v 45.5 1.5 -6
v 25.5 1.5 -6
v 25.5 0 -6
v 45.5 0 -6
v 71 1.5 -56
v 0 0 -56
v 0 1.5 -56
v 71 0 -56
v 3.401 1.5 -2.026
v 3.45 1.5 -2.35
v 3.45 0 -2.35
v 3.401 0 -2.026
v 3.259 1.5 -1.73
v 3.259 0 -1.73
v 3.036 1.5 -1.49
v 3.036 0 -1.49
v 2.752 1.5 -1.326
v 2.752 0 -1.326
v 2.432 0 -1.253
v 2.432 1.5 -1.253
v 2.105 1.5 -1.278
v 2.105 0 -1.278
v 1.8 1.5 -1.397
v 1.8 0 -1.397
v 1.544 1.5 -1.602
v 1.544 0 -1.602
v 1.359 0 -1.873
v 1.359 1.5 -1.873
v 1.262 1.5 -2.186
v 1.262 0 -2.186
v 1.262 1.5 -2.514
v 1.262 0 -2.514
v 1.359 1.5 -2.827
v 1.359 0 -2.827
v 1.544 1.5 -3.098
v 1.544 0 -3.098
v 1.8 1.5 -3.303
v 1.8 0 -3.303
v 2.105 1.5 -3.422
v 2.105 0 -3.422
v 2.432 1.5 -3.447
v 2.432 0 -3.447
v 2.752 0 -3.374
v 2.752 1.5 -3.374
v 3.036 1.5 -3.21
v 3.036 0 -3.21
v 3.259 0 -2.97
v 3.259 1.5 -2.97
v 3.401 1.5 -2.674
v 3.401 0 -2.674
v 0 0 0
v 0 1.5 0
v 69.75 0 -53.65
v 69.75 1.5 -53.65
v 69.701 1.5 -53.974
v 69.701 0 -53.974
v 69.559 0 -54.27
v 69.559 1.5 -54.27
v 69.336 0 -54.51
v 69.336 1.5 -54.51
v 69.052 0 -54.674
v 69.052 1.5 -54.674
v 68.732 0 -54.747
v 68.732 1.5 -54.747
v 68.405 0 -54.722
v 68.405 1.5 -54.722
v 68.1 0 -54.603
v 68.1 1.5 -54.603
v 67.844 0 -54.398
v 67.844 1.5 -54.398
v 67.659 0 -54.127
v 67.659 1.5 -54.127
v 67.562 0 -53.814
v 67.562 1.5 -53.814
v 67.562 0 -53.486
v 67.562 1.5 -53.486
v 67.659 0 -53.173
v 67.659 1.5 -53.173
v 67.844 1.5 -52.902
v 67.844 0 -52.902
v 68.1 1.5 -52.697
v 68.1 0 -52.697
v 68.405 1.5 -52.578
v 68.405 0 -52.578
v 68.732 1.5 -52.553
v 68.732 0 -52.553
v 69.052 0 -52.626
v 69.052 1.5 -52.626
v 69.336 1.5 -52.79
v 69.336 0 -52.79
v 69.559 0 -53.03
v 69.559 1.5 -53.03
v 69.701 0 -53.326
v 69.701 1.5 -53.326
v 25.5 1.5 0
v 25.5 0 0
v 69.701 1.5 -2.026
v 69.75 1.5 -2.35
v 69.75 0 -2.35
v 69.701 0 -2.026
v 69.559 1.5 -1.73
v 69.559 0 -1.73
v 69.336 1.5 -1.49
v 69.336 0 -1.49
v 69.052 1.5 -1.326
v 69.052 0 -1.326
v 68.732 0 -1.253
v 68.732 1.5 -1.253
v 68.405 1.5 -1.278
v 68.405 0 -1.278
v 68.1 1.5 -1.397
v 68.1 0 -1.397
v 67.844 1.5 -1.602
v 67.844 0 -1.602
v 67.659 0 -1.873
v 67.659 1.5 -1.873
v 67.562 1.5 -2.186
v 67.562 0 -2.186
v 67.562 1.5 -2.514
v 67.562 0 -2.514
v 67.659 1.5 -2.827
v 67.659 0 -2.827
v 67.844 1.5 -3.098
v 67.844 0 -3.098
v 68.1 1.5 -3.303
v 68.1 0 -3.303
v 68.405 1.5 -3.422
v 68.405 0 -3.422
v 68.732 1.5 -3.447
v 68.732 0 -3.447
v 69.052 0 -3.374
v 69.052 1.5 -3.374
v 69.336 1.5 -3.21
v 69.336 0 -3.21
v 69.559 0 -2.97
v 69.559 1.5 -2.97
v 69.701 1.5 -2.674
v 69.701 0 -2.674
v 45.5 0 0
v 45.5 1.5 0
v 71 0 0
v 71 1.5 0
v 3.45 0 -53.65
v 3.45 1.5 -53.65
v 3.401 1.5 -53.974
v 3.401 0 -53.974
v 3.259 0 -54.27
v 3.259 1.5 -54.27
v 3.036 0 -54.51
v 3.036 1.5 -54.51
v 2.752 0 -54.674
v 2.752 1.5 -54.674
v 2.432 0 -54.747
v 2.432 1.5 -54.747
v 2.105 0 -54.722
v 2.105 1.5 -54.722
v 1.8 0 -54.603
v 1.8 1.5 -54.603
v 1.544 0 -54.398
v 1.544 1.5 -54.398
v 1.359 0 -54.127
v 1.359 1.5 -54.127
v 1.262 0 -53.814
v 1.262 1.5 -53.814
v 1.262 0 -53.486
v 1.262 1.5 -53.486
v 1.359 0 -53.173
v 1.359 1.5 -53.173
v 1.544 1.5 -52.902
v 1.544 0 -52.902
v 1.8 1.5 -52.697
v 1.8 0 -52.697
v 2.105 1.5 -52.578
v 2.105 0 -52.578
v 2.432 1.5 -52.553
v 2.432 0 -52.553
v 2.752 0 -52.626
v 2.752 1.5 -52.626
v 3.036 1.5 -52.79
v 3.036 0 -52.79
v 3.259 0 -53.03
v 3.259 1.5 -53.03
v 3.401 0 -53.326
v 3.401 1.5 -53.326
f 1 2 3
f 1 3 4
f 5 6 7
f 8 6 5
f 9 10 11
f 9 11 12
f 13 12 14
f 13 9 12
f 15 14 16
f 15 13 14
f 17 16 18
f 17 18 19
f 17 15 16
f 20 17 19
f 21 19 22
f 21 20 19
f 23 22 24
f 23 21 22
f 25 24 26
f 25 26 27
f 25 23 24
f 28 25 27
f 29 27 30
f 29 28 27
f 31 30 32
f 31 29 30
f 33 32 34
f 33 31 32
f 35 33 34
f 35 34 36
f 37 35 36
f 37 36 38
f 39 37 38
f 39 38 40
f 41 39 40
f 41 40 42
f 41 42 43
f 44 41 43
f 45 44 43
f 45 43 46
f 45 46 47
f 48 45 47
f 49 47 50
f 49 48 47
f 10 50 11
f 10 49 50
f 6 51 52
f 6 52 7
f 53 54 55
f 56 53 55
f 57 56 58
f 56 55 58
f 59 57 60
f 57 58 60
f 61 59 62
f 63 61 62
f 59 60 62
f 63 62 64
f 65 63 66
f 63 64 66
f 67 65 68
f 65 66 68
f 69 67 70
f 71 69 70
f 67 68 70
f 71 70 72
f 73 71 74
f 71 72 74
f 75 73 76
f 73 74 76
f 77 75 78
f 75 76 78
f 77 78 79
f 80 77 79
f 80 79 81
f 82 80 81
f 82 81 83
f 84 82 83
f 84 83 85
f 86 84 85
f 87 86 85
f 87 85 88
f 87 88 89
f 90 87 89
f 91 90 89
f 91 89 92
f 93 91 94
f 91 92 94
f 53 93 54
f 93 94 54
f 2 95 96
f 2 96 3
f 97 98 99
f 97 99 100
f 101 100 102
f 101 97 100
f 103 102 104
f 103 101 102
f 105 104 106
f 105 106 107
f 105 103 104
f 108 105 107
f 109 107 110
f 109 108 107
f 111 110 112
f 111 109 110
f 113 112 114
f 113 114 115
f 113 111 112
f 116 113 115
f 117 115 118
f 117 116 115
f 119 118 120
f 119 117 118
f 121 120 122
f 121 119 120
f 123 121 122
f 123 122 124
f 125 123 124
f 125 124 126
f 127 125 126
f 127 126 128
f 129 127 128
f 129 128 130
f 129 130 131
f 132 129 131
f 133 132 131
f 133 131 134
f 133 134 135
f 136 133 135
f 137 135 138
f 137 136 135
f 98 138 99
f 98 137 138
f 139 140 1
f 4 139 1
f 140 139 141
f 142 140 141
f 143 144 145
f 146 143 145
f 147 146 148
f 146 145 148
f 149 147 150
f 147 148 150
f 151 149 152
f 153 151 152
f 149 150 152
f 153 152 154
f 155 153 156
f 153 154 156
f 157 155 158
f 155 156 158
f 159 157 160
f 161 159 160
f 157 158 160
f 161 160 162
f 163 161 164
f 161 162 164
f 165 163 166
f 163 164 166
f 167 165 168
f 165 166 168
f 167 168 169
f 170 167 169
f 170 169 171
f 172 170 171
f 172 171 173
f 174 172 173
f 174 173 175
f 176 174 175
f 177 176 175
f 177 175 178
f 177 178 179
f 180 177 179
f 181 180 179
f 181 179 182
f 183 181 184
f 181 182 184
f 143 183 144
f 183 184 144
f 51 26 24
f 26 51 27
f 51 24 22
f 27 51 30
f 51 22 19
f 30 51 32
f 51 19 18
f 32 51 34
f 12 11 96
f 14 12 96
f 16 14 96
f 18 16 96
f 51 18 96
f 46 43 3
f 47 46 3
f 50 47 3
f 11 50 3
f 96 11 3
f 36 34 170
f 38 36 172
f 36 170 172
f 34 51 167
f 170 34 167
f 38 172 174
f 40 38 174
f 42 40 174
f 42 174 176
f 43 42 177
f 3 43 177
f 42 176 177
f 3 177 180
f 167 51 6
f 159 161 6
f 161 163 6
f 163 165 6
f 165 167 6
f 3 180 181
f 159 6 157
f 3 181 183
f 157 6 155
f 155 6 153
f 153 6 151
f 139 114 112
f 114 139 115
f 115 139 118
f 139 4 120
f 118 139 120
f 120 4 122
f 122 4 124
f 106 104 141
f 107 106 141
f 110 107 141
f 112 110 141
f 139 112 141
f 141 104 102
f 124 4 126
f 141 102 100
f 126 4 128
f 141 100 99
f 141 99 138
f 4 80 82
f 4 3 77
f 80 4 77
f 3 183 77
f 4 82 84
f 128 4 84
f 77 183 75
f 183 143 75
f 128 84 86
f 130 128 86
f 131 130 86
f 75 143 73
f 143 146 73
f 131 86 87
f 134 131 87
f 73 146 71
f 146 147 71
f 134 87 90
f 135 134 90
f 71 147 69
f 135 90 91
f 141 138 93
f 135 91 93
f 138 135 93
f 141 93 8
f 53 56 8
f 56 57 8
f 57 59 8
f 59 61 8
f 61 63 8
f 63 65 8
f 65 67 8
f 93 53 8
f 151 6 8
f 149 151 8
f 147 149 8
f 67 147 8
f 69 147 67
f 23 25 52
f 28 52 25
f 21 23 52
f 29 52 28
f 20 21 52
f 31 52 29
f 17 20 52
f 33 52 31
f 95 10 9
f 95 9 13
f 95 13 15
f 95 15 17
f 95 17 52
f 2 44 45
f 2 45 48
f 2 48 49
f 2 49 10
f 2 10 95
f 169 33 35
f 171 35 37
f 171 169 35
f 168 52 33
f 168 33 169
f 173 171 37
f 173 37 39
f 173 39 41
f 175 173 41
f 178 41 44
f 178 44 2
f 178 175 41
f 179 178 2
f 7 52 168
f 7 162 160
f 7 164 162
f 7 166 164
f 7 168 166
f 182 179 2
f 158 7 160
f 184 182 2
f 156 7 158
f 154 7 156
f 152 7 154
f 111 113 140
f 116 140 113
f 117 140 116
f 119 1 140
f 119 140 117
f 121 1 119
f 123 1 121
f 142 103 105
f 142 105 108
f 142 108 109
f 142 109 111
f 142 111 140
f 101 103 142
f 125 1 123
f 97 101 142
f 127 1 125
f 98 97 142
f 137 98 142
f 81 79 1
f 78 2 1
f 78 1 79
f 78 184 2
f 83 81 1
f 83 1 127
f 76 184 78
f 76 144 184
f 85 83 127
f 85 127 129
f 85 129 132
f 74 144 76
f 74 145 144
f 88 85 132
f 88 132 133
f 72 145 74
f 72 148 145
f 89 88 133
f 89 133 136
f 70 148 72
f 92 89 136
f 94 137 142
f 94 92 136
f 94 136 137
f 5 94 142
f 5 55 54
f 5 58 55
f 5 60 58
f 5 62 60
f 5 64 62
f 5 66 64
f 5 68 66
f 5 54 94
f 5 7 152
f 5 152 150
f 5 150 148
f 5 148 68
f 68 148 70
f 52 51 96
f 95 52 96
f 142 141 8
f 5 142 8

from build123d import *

# Parameters (mm, degrees)
SKETCH1_W           = 71
SKETCH1_H           = 56
BOSS_EXTRUDE1_DEPTH = 1.5
SKETCH2_W           = 20
SKETCH2_H           = 6
CUT_EXTRUDE1_DEPTH  = 1.5
SKETCH5_R           = 1.1
CUT_EXTRUDE2_DEPTH  = 1.5


with BuildPart() as part:
    # Sketch1 → Boss-Extrude1 (new body)
    with BuildSketch(Plane(origin=(0, 0, 0), x_dir=(1, 0, 0), z_dir=(0, 1, 0))):
        with Locations((35.5, 28)):
            Rectangle(SKETCH1_W, SKETCH1_H)
    extrude(amount=BOSS_EXTRUDE1_DEPTH)

    # Sketch2 → Cut-Extrude1 (cut)
    with BuildSketch(Plane(origin=(0, 1.5, 0), x_dir=(1, 0, 0), z_dir=(0, 1, 0))):
        with Locations((35.5, 3)):
            Rectangle(SKETCH2_W, SKETCH2_H)
    extrude(amount=-CUT_EXTRUDE1_DEPTH, mode=Mode.SUBTRACT)

    # Sketch5 → Cut-Extrude2 (cut)
    with BuildSketch(Plane(origin=(0, 1.5, 0), x_dir=(1, 0, 0), z_dir=(0, 1, 0))):
        with Locations((2.35, 53.65)):
            Circle(SKETCH5_R)
        with Locations((68.65, 53.65)):
            Circle(SKETCH5_R)
    cut_extrude2 = extrude(amount=-CUT_EXTRUDE2_DEPTH, mode=Mode.SUBTRACT)

    # Mirror1: Cut-Extrude2 across plane
    add(cut_extrude2.mirror(Plane.XY.offset(-28)), mode=Mode.SUBTRACT)


solid = part.part
